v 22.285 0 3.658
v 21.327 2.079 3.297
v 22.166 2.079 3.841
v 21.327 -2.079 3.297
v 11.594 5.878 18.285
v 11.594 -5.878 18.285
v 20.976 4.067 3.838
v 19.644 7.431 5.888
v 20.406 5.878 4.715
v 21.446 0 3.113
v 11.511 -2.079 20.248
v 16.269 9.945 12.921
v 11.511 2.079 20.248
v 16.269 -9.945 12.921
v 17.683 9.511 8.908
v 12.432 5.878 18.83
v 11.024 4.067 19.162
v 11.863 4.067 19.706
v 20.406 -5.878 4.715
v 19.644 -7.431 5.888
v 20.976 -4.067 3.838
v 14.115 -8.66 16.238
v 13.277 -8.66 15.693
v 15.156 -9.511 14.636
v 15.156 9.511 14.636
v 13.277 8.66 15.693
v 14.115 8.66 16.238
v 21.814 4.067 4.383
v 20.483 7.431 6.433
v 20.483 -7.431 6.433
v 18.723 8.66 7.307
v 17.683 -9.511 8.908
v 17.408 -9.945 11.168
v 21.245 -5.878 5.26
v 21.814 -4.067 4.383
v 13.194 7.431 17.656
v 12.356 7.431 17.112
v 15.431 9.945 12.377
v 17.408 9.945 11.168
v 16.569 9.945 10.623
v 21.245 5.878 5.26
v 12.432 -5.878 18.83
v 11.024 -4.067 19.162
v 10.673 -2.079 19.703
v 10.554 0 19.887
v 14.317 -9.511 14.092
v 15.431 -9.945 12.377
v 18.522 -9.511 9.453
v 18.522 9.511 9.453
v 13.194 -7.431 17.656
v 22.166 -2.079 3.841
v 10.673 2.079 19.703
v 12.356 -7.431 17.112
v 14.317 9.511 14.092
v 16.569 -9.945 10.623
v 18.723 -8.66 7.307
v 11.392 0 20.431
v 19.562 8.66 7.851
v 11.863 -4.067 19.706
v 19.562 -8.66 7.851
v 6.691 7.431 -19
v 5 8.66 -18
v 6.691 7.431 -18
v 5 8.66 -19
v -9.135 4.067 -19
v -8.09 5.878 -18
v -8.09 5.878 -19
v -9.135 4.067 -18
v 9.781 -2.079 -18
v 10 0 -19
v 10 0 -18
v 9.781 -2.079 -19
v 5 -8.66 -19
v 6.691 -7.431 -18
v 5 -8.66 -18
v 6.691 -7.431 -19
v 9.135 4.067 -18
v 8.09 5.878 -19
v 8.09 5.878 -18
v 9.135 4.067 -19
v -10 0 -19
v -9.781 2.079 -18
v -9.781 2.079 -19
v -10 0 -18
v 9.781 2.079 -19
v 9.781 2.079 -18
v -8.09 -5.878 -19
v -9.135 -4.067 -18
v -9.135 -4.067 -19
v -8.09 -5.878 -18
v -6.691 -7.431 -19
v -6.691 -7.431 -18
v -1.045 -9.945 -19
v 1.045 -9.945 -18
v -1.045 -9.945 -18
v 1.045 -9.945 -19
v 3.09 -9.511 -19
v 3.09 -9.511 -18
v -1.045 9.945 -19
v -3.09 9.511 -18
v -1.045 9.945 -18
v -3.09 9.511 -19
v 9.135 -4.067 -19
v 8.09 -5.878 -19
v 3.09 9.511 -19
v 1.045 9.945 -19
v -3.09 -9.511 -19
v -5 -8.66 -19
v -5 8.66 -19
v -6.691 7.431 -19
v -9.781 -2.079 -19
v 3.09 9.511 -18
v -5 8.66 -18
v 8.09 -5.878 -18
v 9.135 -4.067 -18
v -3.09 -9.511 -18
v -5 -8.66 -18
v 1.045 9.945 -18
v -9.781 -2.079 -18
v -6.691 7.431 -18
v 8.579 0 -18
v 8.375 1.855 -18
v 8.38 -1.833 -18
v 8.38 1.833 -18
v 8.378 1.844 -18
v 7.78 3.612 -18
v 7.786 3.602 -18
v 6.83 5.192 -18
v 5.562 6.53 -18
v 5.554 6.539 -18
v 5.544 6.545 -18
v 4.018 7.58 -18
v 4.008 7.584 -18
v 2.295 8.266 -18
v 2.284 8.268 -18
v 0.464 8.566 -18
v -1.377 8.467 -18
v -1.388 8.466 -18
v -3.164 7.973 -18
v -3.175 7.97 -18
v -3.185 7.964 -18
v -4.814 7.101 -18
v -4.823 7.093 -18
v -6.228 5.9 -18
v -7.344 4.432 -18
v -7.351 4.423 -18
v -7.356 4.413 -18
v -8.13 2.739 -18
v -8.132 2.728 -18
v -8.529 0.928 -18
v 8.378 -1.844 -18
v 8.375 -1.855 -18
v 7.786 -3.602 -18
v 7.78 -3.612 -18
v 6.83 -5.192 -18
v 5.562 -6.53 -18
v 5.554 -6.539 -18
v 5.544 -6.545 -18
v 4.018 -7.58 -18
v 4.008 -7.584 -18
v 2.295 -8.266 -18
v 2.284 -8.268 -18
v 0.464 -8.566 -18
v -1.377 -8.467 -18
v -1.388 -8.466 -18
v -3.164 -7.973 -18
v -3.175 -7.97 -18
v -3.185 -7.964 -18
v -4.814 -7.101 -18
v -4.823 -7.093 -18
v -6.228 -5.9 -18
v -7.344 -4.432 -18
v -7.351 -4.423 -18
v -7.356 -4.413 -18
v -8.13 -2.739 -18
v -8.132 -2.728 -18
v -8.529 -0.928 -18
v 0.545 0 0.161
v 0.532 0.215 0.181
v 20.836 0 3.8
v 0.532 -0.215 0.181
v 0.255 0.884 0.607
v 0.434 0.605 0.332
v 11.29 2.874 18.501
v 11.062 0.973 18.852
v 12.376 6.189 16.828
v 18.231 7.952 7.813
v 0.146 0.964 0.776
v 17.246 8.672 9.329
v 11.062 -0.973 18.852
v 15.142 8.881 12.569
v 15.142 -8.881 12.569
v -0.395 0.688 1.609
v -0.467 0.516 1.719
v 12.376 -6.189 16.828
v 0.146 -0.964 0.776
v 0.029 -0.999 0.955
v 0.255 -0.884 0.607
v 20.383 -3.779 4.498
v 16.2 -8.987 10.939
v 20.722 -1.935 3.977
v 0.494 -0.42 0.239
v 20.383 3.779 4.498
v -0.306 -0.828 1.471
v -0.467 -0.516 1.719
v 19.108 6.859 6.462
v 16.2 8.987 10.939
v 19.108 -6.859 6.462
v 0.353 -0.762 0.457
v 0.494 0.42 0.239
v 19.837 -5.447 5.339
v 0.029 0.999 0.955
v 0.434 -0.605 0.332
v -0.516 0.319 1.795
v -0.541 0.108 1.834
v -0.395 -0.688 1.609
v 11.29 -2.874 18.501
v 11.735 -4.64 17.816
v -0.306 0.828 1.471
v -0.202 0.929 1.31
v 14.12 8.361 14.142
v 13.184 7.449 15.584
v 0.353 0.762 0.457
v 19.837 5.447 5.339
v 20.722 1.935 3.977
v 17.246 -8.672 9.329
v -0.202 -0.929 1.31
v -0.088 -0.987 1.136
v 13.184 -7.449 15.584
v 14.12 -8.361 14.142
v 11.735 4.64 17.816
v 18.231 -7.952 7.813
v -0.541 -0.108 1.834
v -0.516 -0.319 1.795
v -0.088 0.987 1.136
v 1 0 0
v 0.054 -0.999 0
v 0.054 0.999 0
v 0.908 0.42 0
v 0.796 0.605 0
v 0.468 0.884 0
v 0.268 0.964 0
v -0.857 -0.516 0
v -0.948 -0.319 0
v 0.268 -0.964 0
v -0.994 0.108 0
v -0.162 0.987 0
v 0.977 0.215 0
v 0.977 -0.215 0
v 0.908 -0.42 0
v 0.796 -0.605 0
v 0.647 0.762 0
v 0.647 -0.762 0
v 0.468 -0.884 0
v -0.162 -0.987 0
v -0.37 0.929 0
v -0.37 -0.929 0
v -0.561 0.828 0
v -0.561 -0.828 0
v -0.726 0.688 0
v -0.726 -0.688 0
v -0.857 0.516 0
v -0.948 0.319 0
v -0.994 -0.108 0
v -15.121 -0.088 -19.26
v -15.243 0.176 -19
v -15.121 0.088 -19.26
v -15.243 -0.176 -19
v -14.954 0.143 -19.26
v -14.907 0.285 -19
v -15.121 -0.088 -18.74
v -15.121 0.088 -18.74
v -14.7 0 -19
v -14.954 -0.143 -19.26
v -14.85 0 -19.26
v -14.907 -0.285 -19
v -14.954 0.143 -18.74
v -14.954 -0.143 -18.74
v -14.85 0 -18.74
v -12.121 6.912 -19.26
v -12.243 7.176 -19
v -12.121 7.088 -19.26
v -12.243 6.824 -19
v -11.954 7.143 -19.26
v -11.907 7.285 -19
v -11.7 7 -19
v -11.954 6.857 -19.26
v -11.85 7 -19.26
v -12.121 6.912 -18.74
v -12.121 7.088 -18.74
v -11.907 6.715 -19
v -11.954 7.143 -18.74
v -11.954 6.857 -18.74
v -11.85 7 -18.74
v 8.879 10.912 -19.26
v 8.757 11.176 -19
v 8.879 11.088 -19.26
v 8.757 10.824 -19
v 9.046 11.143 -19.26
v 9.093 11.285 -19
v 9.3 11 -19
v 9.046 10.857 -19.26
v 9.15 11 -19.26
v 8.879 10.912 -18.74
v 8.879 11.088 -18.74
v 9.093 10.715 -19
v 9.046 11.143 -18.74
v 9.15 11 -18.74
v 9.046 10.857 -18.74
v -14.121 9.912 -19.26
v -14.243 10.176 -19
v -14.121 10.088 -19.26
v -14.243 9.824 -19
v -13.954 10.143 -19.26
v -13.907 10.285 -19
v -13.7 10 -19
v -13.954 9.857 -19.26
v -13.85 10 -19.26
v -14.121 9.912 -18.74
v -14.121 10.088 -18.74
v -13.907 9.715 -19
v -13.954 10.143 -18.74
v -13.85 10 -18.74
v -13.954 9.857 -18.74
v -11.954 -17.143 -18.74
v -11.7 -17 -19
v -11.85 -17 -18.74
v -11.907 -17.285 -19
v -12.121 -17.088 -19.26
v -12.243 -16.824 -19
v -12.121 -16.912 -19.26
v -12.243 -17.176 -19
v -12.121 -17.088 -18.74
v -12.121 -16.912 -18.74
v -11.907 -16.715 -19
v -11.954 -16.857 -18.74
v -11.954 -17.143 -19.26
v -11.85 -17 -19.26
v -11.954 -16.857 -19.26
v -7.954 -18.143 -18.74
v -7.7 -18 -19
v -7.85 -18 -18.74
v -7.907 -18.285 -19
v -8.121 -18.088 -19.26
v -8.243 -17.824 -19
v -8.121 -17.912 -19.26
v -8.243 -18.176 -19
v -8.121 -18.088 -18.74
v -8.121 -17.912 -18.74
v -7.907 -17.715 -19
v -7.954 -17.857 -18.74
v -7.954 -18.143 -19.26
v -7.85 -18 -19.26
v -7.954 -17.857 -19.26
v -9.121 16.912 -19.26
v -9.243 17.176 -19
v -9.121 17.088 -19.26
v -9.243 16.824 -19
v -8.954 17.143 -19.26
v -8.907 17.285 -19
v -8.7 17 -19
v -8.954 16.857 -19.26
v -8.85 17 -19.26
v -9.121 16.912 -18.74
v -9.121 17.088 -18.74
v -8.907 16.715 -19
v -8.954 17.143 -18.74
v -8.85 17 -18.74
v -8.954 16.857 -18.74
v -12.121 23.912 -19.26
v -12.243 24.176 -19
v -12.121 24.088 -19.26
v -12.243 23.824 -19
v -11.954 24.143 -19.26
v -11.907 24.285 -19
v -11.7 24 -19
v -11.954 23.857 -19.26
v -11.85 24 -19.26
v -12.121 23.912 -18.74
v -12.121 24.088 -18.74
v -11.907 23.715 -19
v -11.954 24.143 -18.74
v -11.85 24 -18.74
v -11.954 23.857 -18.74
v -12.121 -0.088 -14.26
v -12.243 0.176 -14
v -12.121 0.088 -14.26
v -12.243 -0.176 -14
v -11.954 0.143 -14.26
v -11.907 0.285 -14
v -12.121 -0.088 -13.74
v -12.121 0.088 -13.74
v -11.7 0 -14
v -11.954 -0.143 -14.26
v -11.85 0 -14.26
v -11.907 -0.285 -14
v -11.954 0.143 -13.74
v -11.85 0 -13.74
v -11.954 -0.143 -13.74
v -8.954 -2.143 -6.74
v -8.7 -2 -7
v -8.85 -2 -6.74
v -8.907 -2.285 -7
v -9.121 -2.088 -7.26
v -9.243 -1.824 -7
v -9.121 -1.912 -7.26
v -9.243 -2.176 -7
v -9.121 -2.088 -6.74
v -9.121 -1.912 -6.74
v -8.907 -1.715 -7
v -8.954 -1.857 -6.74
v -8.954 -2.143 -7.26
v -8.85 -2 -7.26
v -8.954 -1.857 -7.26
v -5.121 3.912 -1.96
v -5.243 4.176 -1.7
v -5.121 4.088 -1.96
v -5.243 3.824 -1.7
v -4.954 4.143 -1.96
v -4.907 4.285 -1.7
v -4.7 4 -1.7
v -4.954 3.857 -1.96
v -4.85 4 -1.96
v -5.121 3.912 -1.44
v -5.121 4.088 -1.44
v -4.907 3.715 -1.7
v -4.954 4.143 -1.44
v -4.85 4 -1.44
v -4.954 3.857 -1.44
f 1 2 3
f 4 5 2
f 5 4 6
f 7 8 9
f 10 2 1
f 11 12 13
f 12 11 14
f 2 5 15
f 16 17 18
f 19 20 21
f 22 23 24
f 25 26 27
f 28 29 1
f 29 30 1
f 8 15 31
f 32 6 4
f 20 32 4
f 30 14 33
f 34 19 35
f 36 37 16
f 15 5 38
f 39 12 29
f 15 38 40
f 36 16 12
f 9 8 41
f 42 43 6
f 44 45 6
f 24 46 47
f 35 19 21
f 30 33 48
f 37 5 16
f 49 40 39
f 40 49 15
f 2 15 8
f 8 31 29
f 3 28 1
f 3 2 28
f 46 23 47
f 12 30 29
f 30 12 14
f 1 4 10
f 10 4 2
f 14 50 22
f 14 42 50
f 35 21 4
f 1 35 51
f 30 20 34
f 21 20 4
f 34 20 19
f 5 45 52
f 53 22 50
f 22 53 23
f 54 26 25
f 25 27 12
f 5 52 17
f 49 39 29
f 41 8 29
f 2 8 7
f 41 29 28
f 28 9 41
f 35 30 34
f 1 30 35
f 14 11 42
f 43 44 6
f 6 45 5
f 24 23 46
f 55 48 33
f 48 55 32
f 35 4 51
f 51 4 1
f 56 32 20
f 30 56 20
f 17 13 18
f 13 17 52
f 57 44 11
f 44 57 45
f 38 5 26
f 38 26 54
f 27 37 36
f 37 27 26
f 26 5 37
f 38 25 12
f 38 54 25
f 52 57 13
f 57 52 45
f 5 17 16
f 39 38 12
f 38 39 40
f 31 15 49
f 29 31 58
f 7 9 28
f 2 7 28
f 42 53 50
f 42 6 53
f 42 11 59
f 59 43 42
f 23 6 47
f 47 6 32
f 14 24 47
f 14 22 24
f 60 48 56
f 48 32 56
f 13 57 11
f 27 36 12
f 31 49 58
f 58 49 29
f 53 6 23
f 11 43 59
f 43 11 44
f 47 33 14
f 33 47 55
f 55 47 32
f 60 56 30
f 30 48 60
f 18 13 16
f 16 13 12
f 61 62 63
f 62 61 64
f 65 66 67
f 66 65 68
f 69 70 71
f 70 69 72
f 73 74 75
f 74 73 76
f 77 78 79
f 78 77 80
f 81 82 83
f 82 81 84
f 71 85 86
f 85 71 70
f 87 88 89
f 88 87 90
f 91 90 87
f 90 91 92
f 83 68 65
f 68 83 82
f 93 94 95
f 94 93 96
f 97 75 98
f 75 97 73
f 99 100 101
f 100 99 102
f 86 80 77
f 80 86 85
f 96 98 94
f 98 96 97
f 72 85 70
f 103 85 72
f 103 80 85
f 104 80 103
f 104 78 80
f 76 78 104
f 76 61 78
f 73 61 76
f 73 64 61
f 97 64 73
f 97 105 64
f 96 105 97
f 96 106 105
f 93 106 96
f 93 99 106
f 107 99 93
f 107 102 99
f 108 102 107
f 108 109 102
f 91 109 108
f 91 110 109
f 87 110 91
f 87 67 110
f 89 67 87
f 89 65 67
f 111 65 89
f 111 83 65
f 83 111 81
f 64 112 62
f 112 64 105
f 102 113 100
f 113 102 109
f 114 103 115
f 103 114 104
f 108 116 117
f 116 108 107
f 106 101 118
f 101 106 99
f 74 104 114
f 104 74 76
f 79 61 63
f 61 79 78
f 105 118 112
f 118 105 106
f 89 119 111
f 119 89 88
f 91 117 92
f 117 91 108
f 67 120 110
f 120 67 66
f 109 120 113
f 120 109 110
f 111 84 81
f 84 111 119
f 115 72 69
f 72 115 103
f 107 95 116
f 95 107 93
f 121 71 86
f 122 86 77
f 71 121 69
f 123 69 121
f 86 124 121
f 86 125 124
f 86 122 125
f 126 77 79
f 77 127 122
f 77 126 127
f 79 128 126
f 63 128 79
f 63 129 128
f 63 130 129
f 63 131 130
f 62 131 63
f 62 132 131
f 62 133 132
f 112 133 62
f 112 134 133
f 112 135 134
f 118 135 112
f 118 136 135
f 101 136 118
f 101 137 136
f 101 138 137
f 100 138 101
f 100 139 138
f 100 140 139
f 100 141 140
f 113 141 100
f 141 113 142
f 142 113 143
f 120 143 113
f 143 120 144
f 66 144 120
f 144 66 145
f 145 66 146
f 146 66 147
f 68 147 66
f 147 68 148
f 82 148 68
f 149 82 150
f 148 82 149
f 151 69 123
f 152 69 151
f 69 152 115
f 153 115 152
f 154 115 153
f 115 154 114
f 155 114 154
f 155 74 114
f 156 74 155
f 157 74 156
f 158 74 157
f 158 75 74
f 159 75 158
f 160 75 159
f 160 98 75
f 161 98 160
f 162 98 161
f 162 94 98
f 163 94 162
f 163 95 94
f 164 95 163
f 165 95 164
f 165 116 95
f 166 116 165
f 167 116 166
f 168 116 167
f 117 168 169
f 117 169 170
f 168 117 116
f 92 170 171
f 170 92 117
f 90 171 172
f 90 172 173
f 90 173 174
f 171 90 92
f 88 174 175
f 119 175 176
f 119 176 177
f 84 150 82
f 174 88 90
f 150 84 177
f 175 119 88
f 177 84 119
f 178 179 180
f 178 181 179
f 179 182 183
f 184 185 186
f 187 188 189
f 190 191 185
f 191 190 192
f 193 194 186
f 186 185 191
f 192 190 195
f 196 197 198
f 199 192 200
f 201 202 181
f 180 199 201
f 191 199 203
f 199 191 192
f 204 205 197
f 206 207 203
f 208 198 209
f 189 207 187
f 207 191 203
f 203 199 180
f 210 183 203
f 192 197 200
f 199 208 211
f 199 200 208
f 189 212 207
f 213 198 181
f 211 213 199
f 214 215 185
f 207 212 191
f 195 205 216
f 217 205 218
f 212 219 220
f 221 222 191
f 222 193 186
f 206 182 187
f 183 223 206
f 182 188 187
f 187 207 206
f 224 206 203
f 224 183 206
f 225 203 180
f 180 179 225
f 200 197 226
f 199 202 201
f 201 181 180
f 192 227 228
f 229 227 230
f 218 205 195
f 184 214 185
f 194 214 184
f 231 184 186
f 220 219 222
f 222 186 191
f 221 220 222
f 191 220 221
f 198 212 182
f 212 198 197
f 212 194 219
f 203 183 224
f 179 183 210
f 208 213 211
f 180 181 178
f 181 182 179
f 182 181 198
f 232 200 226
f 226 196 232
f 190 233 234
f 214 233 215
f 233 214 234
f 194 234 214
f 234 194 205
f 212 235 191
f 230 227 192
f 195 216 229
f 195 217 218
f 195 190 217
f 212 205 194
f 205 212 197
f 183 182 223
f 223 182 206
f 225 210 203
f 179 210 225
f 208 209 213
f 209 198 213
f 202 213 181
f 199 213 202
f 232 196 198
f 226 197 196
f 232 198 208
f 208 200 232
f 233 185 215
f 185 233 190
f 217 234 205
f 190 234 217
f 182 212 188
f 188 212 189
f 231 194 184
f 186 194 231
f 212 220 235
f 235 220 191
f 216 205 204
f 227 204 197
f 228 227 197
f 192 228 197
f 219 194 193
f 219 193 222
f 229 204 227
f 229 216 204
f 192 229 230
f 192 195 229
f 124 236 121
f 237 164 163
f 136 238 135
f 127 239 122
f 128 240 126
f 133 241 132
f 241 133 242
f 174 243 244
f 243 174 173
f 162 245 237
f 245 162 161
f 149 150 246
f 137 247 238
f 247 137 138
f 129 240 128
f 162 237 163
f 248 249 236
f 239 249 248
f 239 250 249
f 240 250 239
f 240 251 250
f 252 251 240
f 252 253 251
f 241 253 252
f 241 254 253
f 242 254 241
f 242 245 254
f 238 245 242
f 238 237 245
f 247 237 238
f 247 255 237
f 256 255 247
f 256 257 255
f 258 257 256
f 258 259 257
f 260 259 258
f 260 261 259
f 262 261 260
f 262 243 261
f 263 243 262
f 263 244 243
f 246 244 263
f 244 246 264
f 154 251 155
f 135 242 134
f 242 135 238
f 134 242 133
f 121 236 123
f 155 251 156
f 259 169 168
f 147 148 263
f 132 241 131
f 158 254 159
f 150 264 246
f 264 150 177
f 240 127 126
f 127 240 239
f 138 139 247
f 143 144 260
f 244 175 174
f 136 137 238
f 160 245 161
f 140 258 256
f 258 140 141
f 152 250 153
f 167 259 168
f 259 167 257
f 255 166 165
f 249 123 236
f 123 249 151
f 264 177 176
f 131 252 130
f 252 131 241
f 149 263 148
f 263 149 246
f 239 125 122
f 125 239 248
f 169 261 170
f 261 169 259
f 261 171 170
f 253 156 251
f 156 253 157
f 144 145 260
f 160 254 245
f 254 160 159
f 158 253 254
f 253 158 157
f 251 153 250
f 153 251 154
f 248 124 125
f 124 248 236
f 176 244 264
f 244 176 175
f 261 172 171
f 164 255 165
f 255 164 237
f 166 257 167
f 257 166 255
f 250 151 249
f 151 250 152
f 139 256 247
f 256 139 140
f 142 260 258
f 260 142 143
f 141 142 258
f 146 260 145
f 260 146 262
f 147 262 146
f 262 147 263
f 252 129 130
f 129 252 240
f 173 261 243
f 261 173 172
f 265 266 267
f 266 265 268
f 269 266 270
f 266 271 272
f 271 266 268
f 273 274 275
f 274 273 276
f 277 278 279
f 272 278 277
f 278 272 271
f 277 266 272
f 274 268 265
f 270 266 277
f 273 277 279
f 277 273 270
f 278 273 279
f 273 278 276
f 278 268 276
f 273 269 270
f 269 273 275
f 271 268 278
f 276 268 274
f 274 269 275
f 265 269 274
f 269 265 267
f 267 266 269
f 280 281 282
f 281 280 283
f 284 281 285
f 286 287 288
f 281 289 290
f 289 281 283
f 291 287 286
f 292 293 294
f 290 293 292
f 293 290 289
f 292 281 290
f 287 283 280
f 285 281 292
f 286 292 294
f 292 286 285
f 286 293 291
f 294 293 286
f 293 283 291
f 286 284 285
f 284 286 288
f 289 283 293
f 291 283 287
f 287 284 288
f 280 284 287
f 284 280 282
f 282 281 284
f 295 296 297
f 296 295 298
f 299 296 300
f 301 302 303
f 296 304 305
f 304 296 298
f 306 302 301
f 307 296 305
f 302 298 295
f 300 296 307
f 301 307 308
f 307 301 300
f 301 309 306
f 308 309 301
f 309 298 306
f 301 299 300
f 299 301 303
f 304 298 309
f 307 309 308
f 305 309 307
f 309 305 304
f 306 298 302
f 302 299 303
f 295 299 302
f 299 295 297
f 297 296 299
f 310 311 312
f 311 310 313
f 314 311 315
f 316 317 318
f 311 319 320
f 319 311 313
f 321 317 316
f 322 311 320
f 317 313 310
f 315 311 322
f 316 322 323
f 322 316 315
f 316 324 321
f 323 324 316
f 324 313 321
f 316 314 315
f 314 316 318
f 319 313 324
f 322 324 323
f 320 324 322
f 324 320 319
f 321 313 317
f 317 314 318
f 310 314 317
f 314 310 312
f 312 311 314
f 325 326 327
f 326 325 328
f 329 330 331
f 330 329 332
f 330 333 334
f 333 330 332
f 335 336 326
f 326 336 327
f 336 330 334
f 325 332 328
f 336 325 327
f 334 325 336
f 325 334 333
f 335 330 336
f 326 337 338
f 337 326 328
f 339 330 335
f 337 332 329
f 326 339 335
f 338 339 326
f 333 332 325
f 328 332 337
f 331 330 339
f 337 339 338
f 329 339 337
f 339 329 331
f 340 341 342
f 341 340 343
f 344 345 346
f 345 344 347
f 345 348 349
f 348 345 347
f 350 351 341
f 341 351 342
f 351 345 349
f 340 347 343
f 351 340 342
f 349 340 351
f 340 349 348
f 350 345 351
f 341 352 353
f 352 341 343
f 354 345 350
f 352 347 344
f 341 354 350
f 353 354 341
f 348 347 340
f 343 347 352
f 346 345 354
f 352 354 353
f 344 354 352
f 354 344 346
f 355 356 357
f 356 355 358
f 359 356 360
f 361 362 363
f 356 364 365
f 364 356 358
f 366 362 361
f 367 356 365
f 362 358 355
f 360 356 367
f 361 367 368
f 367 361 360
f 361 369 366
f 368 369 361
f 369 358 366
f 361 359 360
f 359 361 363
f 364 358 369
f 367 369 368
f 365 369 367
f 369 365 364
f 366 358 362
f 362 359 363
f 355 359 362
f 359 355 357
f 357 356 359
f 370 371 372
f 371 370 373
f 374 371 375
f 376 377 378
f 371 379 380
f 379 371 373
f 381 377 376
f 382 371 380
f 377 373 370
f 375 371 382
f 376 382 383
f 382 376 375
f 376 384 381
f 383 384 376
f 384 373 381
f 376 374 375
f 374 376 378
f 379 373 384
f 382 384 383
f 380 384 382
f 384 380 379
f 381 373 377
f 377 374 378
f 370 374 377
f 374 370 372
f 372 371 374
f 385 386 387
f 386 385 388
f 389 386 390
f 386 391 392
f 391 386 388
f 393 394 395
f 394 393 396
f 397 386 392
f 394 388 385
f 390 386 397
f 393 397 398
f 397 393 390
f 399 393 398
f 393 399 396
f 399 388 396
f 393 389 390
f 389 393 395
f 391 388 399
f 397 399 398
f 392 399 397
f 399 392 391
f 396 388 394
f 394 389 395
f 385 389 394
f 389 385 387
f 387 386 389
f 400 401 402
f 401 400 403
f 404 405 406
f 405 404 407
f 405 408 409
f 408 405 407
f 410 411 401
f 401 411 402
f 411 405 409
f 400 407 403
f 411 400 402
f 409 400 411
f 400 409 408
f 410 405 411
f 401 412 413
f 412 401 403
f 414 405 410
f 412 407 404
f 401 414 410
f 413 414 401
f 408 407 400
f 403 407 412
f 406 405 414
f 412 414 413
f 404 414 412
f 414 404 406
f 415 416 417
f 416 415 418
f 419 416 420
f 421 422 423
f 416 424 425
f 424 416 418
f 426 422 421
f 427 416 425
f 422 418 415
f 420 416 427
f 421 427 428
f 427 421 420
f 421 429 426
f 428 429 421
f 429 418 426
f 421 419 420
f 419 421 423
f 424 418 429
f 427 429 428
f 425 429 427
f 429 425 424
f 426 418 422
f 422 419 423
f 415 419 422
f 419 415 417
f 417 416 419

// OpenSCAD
translate([16, 0, 11.5])
    rotate([0, 57, 0])
    cylinder(r = 10, h = 1);
translate([0, 0, -19])
    cylinder(r = 10, h = 1);
translate([0, 0, 1])
    rotate([0, 57, 0])
    cylinder(r1 = 1, r2 = 9, h = 19);
translate([0, 0, -19])
    cylinder(r1 = 9, r2 = 1, h = 19);
translate([-15, 0, -19])
    sphere(r = 0.3);
translate([-12, 7, -19])
    sphere(r = 0.3);
translate([9, 11, -19])
    sphere(r = 0.3);
translate([-14, 10, -19])
    sphere(r = 0.3);
translate([-12, -17, -19])
    sphere(r = 0.3);
translate([-8, -18, -19])
    sphere(r = 0.3);
translate([-9, 17, -19])
    sphere(r = 0.3);
translate([-12, 24, -19])
    sphere(r = 0.3);
translate([-12, 0, -14])
    sphere(r = 0.3);
translate([-9, -2, -7])
    sphere(r = 0.3);
translate([-5, 4, -1.7])
    sphere(r = 0.3);
